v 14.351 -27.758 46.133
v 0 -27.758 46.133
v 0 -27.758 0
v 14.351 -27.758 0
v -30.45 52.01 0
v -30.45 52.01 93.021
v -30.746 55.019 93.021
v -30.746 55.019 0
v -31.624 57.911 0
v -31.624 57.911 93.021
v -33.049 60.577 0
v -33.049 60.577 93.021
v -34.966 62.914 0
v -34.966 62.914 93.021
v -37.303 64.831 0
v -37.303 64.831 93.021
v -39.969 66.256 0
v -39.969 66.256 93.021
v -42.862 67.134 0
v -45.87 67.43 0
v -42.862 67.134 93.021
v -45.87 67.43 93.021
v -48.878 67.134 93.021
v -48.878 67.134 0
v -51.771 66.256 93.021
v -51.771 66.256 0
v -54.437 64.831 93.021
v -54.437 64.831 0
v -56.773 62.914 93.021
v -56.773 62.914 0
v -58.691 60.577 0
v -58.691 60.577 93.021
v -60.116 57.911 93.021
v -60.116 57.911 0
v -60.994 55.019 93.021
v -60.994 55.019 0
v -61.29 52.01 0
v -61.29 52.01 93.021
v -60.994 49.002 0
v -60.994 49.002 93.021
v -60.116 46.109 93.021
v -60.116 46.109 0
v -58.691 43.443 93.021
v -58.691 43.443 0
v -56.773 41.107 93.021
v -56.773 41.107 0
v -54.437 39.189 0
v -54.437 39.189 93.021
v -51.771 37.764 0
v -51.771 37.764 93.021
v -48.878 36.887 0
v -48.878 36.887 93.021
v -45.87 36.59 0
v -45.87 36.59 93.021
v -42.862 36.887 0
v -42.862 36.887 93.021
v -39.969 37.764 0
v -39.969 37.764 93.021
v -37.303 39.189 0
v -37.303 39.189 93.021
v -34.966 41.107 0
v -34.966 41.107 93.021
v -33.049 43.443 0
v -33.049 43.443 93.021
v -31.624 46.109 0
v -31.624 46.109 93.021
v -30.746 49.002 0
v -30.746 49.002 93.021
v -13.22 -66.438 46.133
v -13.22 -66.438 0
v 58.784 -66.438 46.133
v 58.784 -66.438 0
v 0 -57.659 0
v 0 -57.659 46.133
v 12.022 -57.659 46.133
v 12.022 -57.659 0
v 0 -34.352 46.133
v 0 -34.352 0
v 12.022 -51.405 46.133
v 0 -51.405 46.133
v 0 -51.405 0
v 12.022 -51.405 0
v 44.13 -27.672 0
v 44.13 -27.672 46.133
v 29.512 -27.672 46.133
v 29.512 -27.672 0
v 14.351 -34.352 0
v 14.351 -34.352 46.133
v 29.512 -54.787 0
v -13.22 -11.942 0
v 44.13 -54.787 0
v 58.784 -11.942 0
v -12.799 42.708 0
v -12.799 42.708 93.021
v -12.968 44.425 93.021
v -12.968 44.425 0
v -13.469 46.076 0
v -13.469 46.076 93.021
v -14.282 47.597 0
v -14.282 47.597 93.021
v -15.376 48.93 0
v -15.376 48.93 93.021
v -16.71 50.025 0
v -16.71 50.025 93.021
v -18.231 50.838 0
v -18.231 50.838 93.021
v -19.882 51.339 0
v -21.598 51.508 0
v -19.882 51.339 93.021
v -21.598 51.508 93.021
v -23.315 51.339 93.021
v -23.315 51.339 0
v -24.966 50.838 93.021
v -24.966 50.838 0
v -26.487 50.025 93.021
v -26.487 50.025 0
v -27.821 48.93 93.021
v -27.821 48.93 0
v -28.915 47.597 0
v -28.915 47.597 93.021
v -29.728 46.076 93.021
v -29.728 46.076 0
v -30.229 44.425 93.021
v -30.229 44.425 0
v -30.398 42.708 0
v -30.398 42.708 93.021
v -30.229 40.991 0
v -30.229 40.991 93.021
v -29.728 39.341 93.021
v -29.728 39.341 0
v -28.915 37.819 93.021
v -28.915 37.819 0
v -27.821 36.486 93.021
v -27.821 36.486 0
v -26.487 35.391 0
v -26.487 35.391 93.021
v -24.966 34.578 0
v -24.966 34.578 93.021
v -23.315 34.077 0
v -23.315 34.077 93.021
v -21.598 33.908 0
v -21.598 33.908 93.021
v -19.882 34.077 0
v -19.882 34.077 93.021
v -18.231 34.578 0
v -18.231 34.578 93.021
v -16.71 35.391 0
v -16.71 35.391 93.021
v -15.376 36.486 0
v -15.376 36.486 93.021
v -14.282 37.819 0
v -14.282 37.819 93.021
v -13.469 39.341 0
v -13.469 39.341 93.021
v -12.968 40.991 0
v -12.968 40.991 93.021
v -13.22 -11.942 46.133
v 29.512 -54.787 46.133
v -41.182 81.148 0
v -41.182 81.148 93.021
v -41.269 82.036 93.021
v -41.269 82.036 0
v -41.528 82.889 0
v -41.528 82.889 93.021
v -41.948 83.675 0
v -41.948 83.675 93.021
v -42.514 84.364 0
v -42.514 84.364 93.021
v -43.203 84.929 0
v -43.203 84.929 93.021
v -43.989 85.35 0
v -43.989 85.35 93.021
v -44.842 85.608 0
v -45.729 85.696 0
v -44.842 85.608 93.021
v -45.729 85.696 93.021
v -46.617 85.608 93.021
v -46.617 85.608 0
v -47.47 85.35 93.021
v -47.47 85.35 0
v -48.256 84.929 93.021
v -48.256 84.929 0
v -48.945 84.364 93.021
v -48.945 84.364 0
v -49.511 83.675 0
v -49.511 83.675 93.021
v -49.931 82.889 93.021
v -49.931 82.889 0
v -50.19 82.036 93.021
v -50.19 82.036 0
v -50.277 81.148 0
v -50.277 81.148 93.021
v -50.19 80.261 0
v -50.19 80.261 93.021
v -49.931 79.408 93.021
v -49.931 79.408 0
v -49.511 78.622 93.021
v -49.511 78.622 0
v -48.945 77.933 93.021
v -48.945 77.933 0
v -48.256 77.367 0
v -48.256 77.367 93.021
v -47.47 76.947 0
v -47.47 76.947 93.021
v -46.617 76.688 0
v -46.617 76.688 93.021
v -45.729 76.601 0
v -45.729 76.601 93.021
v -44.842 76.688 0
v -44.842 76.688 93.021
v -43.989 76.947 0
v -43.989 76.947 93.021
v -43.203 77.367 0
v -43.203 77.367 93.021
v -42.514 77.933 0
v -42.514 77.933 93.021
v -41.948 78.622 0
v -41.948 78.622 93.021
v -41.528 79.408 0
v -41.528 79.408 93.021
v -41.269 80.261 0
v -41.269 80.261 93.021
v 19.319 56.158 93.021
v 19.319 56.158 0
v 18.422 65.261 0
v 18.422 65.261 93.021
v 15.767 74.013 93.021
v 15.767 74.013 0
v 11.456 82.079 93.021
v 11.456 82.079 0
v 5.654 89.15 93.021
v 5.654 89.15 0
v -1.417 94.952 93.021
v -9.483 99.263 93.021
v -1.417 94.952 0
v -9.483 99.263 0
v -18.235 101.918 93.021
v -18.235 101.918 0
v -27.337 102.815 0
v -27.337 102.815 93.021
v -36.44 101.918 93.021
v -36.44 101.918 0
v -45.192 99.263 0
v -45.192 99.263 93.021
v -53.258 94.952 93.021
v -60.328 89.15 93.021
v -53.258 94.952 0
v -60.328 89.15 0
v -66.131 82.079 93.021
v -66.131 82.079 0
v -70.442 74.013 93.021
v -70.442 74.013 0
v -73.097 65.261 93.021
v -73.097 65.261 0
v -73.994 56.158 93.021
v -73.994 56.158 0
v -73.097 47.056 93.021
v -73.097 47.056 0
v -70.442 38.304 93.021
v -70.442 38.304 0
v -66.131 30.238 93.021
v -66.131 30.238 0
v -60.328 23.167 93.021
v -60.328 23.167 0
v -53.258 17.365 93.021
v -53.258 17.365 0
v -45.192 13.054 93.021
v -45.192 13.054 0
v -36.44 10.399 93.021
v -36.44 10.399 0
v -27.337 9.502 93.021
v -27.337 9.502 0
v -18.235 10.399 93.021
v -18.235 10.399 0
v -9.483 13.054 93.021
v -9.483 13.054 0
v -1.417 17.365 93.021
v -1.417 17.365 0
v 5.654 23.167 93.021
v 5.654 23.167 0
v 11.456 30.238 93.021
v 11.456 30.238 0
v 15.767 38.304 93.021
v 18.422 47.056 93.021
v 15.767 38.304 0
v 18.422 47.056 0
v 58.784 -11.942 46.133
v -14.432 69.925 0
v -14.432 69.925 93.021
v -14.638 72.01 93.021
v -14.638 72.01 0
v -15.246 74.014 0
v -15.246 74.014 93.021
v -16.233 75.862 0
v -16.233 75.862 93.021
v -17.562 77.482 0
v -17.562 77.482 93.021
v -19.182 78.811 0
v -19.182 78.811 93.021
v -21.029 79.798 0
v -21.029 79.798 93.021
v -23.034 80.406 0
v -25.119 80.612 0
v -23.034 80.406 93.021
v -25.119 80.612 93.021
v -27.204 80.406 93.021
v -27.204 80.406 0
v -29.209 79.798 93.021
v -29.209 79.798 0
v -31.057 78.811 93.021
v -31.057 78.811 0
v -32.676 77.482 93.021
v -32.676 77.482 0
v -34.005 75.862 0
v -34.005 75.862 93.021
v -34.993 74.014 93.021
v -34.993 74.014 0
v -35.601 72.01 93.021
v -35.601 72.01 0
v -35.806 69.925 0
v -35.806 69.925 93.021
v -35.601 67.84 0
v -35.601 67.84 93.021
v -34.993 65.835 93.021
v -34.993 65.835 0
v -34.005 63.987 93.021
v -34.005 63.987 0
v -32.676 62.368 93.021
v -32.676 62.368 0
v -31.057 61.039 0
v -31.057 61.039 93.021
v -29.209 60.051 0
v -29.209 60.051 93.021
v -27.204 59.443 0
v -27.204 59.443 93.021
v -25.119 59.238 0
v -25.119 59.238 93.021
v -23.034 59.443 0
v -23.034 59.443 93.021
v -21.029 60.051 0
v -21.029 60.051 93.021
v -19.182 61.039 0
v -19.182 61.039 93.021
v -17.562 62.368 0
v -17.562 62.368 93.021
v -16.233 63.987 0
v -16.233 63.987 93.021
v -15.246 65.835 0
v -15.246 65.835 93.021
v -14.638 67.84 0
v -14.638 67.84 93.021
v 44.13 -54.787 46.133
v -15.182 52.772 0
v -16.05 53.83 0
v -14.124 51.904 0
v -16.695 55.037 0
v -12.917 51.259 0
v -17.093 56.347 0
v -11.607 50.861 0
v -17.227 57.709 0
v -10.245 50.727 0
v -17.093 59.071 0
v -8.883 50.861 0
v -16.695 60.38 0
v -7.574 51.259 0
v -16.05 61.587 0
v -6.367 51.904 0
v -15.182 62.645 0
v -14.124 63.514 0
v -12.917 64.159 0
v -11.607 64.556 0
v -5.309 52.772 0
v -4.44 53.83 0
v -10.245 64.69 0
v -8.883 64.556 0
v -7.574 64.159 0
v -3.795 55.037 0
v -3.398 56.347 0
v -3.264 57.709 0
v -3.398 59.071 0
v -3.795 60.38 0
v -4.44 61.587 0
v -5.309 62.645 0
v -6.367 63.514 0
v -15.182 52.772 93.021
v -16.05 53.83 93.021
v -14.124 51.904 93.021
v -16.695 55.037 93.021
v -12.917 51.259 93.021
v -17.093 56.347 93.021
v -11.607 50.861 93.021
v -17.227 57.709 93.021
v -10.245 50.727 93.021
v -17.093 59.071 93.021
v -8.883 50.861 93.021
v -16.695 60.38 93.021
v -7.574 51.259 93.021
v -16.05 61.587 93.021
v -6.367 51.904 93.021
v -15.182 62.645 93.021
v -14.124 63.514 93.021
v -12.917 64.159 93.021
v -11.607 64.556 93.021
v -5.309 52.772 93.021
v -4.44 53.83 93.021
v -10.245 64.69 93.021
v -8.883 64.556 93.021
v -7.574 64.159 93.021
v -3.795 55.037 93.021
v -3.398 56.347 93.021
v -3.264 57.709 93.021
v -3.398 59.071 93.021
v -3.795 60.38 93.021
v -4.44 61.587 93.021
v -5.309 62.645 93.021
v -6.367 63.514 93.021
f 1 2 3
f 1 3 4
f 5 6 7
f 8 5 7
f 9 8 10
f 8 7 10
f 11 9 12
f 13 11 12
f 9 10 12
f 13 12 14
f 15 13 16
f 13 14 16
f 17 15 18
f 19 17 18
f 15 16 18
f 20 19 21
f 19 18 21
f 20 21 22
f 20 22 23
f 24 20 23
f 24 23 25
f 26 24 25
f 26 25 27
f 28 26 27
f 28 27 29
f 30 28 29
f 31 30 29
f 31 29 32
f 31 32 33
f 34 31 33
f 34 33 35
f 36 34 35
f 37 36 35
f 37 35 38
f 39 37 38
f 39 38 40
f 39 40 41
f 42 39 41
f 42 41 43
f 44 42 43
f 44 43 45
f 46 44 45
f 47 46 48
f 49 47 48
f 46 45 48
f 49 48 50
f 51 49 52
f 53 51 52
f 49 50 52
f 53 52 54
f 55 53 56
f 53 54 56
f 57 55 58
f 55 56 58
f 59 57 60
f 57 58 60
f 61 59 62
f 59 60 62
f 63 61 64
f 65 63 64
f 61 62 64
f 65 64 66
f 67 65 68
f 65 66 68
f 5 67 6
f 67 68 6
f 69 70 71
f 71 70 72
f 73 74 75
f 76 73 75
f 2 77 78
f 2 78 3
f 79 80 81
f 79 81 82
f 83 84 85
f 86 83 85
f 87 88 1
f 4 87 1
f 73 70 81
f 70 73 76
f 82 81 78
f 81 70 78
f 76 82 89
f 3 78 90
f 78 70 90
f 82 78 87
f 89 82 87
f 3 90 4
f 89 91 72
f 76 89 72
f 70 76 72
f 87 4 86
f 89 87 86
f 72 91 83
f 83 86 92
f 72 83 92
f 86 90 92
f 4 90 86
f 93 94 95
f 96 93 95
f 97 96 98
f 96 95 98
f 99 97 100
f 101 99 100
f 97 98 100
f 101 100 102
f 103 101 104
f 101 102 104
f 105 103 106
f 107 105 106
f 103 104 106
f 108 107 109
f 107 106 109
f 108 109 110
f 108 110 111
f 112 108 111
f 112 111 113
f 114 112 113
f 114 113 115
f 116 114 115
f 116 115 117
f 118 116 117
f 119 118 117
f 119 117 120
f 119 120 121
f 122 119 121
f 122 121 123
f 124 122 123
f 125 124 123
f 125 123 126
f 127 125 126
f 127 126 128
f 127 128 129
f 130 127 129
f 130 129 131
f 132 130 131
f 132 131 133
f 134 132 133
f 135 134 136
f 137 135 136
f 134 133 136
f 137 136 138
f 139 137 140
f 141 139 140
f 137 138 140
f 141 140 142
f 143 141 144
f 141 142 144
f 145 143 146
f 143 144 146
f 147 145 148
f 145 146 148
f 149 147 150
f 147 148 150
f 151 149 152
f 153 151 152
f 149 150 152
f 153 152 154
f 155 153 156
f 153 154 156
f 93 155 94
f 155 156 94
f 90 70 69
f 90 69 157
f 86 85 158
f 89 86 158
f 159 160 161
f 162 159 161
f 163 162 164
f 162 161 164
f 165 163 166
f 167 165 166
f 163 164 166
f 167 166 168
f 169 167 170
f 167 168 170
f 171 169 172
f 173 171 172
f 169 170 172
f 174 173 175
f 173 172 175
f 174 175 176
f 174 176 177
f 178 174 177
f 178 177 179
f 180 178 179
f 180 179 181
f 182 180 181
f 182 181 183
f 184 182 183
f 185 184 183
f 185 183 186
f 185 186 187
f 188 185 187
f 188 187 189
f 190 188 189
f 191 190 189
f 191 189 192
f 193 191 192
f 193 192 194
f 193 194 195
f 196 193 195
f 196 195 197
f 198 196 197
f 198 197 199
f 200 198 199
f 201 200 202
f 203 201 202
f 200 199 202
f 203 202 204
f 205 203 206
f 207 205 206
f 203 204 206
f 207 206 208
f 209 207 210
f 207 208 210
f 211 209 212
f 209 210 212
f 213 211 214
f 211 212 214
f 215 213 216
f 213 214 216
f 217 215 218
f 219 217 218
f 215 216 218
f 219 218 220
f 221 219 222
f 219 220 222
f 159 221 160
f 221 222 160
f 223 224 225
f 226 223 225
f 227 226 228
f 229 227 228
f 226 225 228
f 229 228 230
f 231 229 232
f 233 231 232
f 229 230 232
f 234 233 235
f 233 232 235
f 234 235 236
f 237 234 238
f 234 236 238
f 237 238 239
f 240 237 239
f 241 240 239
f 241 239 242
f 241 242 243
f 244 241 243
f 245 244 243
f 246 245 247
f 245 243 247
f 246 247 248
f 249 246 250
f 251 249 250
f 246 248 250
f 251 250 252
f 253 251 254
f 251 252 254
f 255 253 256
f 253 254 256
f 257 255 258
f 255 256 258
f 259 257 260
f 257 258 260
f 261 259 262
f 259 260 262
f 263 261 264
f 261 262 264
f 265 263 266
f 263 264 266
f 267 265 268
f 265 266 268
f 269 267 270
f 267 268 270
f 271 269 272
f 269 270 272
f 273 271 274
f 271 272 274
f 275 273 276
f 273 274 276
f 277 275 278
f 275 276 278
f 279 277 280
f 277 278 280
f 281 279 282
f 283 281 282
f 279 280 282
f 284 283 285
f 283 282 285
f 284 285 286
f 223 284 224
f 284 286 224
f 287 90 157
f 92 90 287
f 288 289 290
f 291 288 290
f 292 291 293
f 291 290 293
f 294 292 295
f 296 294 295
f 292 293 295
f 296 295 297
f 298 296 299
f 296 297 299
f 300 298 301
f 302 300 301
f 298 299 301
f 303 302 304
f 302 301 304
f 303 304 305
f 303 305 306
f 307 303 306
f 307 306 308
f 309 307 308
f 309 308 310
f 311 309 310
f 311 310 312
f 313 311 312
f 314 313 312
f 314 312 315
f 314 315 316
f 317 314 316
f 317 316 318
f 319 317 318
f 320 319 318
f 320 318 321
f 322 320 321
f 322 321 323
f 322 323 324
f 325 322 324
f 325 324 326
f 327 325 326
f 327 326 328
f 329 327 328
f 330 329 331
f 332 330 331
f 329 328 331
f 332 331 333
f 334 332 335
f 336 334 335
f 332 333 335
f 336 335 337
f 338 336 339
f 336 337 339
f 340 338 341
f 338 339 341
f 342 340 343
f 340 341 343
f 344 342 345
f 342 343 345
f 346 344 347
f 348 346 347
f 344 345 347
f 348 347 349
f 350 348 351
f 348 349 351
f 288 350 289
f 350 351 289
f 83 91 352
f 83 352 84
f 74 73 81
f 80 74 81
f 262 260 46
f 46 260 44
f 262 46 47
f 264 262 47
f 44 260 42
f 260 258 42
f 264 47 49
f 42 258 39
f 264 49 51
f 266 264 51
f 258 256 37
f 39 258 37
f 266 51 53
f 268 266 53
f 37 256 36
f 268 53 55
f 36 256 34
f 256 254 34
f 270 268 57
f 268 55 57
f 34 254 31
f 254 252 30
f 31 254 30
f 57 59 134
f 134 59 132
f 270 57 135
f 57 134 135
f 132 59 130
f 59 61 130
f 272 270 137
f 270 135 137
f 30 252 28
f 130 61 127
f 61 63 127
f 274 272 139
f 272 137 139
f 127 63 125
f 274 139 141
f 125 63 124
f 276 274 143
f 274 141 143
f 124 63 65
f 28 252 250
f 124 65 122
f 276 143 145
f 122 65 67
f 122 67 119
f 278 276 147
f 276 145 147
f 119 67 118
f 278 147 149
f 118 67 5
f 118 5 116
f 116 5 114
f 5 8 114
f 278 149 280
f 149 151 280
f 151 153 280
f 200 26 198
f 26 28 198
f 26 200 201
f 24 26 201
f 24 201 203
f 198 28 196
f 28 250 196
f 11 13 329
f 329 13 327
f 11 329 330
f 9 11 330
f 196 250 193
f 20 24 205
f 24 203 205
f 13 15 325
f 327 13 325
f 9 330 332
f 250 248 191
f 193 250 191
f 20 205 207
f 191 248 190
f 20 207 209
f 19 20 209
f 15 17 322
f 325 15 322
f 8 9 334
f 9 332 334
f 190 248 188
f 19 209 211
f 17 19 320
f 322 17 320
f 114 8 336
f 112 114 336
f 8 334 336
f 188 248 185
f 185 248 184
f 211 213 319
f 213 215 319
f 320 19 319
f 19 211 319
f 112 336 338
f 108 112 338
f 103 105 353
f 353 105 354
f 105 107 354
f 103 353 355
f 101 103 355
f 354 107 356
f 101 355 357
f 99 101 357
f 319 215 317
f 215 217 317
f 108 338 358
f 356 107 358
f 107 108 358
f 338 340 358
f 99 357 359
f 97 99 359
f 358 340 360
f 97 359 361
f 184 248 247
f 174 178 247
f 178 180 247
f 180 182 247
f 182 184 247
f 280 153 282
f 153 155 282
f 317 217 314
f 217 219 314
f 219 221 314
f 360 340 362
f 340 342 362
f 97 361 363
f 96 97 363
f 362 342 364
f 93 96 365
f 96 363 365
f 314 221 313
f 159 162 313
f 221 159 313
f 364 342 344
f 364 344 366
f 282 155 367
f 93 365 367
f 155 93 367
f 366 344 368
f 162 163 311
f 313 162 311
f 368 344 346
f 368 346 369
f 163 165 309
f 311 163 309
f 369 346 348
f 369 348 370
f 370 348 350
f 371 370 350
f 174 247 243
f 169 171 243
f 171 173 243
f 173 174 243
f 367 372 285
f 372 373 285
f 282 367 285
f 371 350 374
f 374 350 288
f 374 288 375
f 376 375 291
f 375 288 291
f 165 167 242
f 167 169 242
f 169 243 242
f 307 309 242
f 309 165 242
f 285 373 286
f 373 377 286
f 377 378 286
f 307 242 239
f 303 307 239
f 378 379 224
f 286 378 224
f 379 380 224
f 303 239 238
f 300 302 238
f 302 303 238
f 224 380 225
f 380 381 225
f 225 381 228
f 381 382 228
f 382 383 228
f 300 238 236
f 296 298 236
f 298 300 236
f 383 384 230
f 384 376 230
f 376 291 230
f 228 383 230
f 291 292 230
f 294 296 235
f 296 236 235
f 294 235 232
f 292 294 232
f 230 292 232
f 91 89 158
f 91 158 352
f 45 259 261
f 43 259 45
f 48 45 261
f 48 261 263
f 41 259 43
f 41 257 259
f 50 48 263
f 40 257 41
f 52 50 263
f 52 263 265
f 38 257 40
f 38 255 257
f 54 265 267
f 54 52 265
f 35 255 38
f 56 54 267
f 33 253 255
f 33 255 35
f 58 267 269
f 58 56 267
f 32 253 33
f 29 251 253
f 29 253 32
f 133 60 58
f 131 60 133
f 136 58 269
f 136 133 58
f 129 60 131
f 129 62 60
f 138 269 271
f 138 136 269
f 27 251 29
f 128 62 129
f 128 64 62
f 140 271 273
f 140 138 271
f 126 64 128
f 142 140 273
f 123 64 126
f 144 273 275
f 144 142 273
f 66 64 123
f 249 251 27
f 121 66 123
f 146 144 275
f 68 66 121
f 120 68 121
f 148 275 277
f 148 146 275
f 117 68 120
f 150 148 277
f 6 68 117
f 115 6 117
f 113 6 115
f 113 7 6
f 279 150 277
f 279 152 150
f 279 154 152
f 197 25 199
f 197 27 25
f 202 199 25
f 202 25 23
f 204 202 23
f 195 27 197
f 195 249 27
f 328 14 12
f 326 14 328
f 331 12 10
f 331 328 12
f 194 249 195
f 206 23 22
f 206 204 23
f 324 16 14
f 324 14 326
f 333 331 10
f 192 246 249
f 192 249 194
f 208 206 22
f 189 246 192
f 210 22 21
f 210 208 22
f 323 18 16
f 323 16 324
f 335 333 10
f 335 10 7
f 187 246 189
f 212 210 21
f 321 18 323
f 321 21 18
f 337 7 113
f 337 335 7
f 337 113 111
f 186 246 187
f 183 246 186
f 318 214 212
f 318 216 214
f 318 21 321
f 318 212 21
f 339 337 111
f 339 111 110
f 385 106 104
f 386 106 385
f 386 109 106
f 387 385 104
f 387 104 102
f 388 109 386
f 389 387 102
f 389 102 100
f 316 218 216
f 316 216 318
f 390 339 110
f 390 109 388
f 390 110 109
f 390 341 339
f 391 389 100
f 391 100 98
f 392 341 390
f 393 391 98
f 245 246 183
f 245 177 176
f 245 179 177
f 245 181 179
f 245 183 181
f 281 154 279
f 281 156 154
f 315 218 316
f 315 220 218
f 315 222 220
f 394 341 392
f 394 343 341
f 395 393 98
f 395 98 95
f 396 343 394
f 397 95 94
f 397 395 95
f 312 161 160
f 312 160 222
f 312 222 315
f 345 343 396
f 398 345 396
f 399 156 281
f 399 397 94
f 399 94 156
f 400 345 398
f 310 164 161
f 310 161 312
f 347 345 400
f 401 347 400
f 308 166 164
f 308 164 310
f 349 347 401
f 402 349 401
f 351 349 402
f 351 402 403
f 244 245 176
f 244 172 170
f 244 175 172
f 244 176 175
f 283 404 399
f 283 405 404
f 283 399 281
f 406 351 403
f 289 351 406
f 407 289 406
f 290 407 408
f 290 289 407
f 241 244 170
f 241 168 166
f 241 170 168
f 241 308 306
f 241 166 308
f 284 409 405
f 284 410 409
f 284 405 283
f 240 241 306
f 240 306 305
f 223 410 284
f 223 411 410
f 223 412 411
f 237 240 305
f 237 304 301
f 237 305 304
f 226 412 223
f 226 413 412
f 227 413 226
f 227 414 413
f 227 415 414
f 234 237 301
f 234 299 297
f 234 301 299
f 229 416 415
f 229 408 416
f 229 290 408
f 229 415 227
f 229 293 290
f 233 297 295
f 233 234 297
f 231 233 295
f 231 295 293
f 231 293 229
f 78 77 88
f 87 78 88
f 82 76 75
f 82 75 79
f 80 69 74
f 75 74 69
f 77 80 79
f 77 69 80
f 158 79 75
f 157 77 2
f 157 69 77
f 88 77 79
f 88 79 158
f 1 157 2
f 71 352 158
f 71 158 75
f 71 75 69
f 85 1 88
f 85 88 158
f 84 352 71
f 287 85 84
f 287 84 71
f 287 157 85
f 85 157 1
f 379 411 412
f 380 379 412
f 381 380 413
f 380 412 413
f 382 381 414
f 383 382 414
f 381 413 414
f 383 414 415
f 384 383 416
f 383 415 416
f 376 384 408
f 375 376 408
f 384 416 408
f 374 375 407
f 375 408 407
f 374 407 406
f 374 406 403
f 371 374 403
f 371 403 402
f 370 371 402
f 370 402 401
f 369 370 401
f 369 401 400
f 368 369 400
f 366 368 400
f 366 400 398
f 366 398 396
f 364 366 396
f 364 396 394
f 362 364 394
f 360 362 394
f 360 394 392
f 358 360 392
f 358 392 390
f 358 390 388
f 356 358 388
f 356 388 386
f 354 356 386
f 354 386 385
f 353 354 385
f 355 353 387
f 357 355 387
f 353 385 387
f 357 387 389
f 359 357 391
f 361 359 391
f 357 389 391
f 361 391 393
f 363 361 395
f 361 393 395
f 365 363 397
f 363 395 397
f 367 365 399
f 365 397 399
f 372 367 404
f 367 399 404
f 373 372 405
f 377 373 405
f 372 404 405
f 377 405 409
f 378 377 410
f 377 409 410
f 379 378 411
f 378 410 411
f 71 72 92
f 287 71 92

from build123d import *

# Parameters (mm, degrees)
F0_R     = 46.6564123897
F1_DEPTH = 93.02102
F2_R     = 15.4199057957
F2_R_2   = 8.799658794
F2_R_3   = 10.6869364606
F2_R_4   = 6.9814277781
F2_R_5   = 4.5474322162
F3_DEPTH = 93.02202
F4_W     = 72.0044821501
F4_H     = 54.4962286949
F5_DEPTH = 46.13302
F6_W     = 12.0218303055
F6_H     = 6.253413856
F6_W_2   = 14.3514992669
F6_H_2   = 6.5944101661
F6_W_3   = 7.8991614282
F6_H_3   = 6.537348032
F6_W_4   = 7.3091201484
F6_H_4   = 8.640371263
F7_DEPTH = 46.13402


with BuildPart() as f1:
    # F0 (on Top) → F1 (new body)
    with BuildSketch(Plane.XY):
        with Locations((-27.3374225944, 56.1584420502)):
            Circle(F0_R)
    extrude(amount=F1_DEPTH)

    # F2 (on face) → F3 (cut, through all)
    with BuildSketch(Plane.XY.offset(93.02102)):
        with Locations((-45.8699427545, 52.0102418959)):
            Circle(F2_R)
        with Locations((-21.5983781964, 42.7080392838)):
            Circle(F2_R_2)
        with Locations((-25.1191779971, 69.9246972799)):
            Circle(F2_R_3)
        with Locations((-10.2453297004, 57.7087067068)):
            Circle(F2_R_4)
        with Locations((-45.7294657826, 81.1484307051)):
            Circle(F2_R_5)
    extrude(amount=-F3_DEPTH, mode=Mode.SUBTRACT)


with BuildPart() as f5:
    # F4 (on Top) → F5 (new body)
    with BuildSketch(Plane.XY):
        with Locations((22.7820724249, -39.1899049282)):
            Rectangle(F4_W, F4_H)
    extrude(amount=F5_DEPTH)

    # F6 (on face) → F7 (cut, through all)
    with BuildSketch(Plane.XY.offset(46.13302)):
        with Locations((6.0109151527, -54.5318871737)):
            Rectangle(F6_W, F6_H)
        with Locations((7.1757496335, -31.0550415888)):
            Rectangle(F6_W_2, F6_H_2)
        with Locations((33.4615428001, -44.4978475571)):
            Rectangle(F6_W_3, F6_H_3)
        with Locations((40.4756423086, -31.991712749)):
            Rectangle(F6_W_4, F6_H_4)
        Polygon((29.511962086, -47.7665215731), (29.511962086, -54.7868199646), (44.1302023828, -54.7868199646), (44.1302023828, -36.3118983805), (36.8210822344, -36.3118983805), (36.8210822344, -27.6715271175), (29.511962086, -27.6715271175), (29.511962086, -41.2291735411), (37.4111235142, -41.2291735411), (37.4111235142, -47.7665215731), align=None)
    extrude(amount=-F7_DEPTH, mode=Mode.SUBTRACT)


solid = Compound([f1.part, f5.part])
